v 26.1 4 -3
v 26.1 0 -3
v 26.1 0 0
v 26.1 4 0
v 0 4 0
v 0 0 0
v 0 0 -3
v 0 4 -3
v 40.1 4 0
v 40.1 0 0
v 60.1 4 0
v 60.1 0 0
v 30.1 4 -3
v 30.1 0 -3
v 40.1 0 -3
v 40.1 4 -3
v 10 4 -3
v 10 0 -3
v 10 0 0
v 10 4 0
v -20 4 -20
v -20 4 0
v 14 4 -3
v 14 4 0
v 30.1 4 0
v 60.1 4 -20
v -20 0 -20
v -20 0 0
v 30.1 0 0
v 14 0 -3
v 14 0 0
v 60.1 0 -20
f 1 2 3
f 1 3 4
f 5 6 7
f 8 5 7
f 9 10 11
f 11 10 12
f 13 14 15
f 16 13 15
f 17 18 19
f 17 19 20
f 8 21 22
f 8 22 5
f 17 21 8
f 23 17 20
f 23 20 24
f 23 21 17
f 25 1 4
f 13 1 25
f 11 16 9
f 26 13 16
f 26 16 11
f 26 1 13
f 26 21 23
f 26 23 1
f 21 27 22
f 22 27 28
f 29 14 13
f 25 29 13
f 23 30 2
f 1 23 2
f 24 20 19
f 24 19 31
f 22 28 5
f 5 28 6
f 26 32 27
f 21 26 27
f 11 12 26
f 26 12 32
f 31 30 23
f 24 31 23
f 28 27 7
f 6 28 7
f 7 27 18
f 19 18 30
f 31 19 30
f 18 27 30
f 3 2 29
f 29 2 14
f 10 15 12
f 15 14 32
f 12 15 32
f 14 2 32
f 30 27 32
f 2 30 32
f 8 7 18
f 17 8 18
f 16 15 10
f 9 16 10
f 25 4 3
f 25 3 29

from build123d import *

# Parameters (mm, degrees)
EXTRUDE_1_DEPTH = 4
SKETCH_2_W      = 4
SKETCH_2_H      = 4
EXTRUDE_2_DEPTH = 3


with BuildPart() as part:
    # Эскиз1 → Бобышка-Вытянуть1 (new body)
    with BuildSketch(Plane(origin=(0, 0, 0), x_dir=(1, 0, 0), z_dir=(0, 1, 0))):
        Polygon((0, 0), (0, 3), (40.1, 3), (40.1, 0), (60.1, 0), (60.1, 20), (-20, 20), (-20, 0), align=None)
    extrude(amount=EXTRUDE_1_DEPTH)

    # Эскиз2 → Бобышка-Вытянуть2 (add)
    with BuildSketch(Plane.XY.offset(-3)):
        with Locations((28.1, 2)):
            Rectangle(SKETCH_2_W, SKETCH_2_H)
        with Locations((12, 2)):
            Rectangle(SKETCH_2_W, SKETCH_2_H)
    extrude(amount=EXTRUDE_2_DEPTH)


solid = part.part
